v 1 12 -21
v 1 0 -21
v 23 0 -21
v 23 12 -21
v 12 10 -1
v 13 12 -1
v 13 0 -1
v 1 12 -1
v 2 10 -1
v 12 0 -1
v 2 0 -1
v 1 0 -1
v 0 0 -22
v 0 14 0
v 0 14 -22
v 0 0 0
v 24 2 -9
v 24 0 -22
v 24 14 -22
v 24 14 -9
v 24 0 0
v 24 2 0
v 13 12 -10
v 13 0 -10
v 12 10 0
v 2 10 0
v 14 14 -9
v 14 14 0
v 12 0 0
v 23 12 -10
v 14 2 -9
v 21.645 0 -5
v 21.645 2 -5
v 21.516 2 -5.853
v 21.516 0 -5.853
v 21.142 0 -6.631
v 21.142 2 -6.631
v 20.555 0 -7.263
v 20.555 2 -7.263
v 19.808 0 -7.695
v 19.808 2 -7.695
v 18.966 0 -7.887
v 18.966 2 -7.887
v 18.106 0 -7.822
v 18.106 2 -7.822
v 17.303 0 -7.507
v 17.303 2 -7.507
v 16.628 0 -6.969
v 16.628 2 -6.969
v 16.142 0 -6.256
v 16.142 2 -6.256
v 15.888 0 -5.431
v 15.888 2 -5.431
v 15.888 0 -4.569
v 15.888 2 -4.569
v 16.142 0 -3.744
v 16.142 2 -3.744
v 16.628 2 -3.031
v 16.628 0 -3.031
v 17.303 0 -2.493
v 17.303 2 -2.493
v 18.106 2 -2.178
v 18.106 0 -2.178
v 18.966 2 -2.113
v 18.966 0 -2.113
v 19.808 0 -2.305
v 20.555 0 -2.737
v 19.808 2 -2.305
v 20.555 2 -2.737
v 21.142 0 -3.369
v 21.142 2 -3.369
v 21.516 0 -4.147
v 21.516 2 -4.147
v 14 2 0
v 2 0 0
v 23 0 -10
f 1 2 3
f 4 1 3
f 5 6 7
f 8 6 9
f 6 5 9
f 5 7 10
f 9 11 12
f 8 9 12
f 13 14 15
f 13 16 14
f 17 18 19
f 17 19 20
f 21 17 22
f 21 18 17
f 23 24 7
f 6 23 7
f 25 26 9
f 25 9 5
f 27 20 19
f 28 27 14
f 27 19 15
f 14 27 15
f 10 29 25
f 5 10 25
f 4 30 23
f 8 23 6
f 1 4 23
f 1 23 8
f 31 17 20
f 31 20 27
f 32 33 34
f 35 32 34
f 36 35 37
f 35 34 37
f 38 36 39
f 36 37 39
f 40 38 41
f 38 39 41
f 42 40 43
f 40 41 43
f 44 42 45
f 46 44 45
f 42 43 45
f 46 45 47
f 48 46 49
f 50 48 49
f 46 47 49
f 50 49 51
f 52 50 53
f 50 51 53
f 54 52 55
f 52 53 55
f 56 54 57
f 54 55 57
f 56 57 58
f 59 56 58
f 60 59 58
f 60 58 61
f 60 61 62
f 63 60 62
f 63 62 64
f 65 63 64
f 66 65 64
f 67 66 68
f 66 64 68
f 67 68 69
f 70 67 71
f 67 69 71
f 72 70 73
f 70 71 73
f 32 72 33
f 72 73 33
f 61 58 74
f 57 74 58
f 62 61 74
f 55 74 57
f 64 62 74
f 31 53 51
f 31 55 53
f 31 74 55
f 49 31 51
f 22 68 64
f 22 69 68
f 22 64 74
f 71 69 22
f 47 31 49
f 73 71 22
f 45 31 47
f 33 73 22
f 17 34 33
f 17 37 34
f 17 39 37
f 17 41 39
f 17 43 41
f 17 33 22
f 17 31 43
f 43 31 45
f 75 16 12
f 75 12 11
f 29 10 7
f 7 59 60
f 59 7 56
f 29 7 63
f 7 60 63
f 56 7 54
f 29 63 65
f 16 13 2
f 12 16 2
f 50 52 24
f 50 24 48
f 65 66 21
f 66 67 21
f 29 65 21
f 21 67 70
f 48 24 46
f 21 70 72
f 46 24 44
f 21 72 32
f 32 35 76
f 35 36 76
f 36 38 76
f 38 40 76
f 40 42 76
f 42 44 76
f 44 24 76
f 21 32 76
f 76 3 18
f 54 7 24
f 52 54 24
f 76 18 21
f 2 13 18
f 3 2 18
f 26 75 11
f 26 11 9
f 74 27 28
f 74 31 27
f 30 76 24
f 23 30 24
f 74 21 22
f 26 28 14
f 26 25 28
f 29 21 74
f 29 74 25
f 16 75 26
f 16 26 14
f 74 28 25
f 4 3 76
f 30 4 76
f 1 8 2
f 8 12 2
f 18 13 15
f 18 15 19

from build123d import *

# Parameters (mm, degrees)
ESQUISSE1_W             = 24
ESQUISSE1_H             = 22
BOSS_EXTRU_1_DEPTH      = 2
ENL_V_MAT_EXTRU_1_DEPTH = 2
ESQUISSE3_R             = 1.75
ENL_V_MAT_EXTRU_2_DEPTH = 2
ESQUISSE4_R             = 2.894655209
ENL_V_MAT_EXTRU_3_DEPTH = 2
BOSS_EXTRU_2_DEPTH      = 10
ESQUISSE6_W             = 10
ESQUISSE6_H             = 10
ENL_V_MAT_EXTRU_4_DEPTH = 10
BOSS_EXTRU_3_DEPTH      = 2


with BuildPart() as part:
    # Esquisse1 → Boss.-Extru.1 (new body)
    with BuildSketch(Plane(origin=(0, 0, 0), x_dir=(1, 0, 0), z_dir=(0, 1, 0))):
        with Locations((12, 11)):
            Rectangle(ESQUISSE1_W, ESQUISSE1_H)
    extrude(amount=BOSS_EXTRU_1_DEPTH)

    # Esquisse2 → Enlèv. mat.-Extru.1 (cut)
    with BuildSketch(Plane(origin=(0, 2, 0), x_dir=(1, 0, 0), z_dir=(0, 1, 0))):
        Polygon((1, 21), (23, 21), (23, 10), (13, 10), (13, 1), (1, 1), align=None)
    extrude(amount=-ENL_V_MAT_EXTRU_1_DEPTH, mode=Mode.SUBTRACT)

    # Esquisse3 → Enlèv. mat.-Extru.2 (cut)
    with BuildSketch(Plane(origin=(0, 2, 0), x_dir=(1, 0, 0), z_dir=(0, 1, 0))):
        with Locations((18.75, 5)):
            Circle(ESQUISSE3_R)
    extrude(amount=-ENL_V_MAT_EXTRU_2_DEPTH, mode=Mode.SUBTRACT)

    # Esquisse4 → Enlèv. mat.-Extru.3 (cut)
    with BuildSketch(Plane(origin=(0, 2, 0), x_dir=(1, 0, 0), z_dir=(0, 1, 0))):
        with Locations((18.75, 5)):
            Circle(ESQUISSE4_R)
    extrude(amount=-ENL_V_MAT_EXTRU_3_DEPTH, mode=Mode.SUBTRACT)

    # Esquisse5 → Boss.-Extru.2 (add)
    with BuildSketch(Plane(origin=(0, 2, 0), x_dir=(1, 0, 0), z_dir=(0, 1, 0))):
        Polygon((14, 0), (14, 9), (24, 9), (24, 22), (0, 22), (0, 0), align=None)
        Polygon((1, 1), (1, 21), (23, 21), (23, 10), (13, 10), (13, 1), align=None, mode=Mode.SUBTRACT)
    extrude(amount=BOSS_EXTRU_2_DEPTH)

    # Esquisse6 → Enlèv. mat.-Extru.4 (cut)
    with BuildSketch(Plane.XY):
        with Locations((7, 5)):
            Rectangle(ESQUISSE6_W, ESQUISSE6_H)
    extrude(amount=-ENL_V_MAT_EXTRU_4_DEPTH, mode=Mode.SUBTRACT)

    # Esquisse8 → Boss.-Extru.3 (add)
    with BuildSketch(Plane(origin=(0, 12, 0), x_dir=(1, 0, 0), z_dir=(0, 1, 0))):
        Polygon((0, 0), (0, 22), (24, 22), (24, 9), (14, 9), (14, 0), align=None)
    extrude(amount=BOSS_EXTRU_3_DEPTH)


solid = part.part
